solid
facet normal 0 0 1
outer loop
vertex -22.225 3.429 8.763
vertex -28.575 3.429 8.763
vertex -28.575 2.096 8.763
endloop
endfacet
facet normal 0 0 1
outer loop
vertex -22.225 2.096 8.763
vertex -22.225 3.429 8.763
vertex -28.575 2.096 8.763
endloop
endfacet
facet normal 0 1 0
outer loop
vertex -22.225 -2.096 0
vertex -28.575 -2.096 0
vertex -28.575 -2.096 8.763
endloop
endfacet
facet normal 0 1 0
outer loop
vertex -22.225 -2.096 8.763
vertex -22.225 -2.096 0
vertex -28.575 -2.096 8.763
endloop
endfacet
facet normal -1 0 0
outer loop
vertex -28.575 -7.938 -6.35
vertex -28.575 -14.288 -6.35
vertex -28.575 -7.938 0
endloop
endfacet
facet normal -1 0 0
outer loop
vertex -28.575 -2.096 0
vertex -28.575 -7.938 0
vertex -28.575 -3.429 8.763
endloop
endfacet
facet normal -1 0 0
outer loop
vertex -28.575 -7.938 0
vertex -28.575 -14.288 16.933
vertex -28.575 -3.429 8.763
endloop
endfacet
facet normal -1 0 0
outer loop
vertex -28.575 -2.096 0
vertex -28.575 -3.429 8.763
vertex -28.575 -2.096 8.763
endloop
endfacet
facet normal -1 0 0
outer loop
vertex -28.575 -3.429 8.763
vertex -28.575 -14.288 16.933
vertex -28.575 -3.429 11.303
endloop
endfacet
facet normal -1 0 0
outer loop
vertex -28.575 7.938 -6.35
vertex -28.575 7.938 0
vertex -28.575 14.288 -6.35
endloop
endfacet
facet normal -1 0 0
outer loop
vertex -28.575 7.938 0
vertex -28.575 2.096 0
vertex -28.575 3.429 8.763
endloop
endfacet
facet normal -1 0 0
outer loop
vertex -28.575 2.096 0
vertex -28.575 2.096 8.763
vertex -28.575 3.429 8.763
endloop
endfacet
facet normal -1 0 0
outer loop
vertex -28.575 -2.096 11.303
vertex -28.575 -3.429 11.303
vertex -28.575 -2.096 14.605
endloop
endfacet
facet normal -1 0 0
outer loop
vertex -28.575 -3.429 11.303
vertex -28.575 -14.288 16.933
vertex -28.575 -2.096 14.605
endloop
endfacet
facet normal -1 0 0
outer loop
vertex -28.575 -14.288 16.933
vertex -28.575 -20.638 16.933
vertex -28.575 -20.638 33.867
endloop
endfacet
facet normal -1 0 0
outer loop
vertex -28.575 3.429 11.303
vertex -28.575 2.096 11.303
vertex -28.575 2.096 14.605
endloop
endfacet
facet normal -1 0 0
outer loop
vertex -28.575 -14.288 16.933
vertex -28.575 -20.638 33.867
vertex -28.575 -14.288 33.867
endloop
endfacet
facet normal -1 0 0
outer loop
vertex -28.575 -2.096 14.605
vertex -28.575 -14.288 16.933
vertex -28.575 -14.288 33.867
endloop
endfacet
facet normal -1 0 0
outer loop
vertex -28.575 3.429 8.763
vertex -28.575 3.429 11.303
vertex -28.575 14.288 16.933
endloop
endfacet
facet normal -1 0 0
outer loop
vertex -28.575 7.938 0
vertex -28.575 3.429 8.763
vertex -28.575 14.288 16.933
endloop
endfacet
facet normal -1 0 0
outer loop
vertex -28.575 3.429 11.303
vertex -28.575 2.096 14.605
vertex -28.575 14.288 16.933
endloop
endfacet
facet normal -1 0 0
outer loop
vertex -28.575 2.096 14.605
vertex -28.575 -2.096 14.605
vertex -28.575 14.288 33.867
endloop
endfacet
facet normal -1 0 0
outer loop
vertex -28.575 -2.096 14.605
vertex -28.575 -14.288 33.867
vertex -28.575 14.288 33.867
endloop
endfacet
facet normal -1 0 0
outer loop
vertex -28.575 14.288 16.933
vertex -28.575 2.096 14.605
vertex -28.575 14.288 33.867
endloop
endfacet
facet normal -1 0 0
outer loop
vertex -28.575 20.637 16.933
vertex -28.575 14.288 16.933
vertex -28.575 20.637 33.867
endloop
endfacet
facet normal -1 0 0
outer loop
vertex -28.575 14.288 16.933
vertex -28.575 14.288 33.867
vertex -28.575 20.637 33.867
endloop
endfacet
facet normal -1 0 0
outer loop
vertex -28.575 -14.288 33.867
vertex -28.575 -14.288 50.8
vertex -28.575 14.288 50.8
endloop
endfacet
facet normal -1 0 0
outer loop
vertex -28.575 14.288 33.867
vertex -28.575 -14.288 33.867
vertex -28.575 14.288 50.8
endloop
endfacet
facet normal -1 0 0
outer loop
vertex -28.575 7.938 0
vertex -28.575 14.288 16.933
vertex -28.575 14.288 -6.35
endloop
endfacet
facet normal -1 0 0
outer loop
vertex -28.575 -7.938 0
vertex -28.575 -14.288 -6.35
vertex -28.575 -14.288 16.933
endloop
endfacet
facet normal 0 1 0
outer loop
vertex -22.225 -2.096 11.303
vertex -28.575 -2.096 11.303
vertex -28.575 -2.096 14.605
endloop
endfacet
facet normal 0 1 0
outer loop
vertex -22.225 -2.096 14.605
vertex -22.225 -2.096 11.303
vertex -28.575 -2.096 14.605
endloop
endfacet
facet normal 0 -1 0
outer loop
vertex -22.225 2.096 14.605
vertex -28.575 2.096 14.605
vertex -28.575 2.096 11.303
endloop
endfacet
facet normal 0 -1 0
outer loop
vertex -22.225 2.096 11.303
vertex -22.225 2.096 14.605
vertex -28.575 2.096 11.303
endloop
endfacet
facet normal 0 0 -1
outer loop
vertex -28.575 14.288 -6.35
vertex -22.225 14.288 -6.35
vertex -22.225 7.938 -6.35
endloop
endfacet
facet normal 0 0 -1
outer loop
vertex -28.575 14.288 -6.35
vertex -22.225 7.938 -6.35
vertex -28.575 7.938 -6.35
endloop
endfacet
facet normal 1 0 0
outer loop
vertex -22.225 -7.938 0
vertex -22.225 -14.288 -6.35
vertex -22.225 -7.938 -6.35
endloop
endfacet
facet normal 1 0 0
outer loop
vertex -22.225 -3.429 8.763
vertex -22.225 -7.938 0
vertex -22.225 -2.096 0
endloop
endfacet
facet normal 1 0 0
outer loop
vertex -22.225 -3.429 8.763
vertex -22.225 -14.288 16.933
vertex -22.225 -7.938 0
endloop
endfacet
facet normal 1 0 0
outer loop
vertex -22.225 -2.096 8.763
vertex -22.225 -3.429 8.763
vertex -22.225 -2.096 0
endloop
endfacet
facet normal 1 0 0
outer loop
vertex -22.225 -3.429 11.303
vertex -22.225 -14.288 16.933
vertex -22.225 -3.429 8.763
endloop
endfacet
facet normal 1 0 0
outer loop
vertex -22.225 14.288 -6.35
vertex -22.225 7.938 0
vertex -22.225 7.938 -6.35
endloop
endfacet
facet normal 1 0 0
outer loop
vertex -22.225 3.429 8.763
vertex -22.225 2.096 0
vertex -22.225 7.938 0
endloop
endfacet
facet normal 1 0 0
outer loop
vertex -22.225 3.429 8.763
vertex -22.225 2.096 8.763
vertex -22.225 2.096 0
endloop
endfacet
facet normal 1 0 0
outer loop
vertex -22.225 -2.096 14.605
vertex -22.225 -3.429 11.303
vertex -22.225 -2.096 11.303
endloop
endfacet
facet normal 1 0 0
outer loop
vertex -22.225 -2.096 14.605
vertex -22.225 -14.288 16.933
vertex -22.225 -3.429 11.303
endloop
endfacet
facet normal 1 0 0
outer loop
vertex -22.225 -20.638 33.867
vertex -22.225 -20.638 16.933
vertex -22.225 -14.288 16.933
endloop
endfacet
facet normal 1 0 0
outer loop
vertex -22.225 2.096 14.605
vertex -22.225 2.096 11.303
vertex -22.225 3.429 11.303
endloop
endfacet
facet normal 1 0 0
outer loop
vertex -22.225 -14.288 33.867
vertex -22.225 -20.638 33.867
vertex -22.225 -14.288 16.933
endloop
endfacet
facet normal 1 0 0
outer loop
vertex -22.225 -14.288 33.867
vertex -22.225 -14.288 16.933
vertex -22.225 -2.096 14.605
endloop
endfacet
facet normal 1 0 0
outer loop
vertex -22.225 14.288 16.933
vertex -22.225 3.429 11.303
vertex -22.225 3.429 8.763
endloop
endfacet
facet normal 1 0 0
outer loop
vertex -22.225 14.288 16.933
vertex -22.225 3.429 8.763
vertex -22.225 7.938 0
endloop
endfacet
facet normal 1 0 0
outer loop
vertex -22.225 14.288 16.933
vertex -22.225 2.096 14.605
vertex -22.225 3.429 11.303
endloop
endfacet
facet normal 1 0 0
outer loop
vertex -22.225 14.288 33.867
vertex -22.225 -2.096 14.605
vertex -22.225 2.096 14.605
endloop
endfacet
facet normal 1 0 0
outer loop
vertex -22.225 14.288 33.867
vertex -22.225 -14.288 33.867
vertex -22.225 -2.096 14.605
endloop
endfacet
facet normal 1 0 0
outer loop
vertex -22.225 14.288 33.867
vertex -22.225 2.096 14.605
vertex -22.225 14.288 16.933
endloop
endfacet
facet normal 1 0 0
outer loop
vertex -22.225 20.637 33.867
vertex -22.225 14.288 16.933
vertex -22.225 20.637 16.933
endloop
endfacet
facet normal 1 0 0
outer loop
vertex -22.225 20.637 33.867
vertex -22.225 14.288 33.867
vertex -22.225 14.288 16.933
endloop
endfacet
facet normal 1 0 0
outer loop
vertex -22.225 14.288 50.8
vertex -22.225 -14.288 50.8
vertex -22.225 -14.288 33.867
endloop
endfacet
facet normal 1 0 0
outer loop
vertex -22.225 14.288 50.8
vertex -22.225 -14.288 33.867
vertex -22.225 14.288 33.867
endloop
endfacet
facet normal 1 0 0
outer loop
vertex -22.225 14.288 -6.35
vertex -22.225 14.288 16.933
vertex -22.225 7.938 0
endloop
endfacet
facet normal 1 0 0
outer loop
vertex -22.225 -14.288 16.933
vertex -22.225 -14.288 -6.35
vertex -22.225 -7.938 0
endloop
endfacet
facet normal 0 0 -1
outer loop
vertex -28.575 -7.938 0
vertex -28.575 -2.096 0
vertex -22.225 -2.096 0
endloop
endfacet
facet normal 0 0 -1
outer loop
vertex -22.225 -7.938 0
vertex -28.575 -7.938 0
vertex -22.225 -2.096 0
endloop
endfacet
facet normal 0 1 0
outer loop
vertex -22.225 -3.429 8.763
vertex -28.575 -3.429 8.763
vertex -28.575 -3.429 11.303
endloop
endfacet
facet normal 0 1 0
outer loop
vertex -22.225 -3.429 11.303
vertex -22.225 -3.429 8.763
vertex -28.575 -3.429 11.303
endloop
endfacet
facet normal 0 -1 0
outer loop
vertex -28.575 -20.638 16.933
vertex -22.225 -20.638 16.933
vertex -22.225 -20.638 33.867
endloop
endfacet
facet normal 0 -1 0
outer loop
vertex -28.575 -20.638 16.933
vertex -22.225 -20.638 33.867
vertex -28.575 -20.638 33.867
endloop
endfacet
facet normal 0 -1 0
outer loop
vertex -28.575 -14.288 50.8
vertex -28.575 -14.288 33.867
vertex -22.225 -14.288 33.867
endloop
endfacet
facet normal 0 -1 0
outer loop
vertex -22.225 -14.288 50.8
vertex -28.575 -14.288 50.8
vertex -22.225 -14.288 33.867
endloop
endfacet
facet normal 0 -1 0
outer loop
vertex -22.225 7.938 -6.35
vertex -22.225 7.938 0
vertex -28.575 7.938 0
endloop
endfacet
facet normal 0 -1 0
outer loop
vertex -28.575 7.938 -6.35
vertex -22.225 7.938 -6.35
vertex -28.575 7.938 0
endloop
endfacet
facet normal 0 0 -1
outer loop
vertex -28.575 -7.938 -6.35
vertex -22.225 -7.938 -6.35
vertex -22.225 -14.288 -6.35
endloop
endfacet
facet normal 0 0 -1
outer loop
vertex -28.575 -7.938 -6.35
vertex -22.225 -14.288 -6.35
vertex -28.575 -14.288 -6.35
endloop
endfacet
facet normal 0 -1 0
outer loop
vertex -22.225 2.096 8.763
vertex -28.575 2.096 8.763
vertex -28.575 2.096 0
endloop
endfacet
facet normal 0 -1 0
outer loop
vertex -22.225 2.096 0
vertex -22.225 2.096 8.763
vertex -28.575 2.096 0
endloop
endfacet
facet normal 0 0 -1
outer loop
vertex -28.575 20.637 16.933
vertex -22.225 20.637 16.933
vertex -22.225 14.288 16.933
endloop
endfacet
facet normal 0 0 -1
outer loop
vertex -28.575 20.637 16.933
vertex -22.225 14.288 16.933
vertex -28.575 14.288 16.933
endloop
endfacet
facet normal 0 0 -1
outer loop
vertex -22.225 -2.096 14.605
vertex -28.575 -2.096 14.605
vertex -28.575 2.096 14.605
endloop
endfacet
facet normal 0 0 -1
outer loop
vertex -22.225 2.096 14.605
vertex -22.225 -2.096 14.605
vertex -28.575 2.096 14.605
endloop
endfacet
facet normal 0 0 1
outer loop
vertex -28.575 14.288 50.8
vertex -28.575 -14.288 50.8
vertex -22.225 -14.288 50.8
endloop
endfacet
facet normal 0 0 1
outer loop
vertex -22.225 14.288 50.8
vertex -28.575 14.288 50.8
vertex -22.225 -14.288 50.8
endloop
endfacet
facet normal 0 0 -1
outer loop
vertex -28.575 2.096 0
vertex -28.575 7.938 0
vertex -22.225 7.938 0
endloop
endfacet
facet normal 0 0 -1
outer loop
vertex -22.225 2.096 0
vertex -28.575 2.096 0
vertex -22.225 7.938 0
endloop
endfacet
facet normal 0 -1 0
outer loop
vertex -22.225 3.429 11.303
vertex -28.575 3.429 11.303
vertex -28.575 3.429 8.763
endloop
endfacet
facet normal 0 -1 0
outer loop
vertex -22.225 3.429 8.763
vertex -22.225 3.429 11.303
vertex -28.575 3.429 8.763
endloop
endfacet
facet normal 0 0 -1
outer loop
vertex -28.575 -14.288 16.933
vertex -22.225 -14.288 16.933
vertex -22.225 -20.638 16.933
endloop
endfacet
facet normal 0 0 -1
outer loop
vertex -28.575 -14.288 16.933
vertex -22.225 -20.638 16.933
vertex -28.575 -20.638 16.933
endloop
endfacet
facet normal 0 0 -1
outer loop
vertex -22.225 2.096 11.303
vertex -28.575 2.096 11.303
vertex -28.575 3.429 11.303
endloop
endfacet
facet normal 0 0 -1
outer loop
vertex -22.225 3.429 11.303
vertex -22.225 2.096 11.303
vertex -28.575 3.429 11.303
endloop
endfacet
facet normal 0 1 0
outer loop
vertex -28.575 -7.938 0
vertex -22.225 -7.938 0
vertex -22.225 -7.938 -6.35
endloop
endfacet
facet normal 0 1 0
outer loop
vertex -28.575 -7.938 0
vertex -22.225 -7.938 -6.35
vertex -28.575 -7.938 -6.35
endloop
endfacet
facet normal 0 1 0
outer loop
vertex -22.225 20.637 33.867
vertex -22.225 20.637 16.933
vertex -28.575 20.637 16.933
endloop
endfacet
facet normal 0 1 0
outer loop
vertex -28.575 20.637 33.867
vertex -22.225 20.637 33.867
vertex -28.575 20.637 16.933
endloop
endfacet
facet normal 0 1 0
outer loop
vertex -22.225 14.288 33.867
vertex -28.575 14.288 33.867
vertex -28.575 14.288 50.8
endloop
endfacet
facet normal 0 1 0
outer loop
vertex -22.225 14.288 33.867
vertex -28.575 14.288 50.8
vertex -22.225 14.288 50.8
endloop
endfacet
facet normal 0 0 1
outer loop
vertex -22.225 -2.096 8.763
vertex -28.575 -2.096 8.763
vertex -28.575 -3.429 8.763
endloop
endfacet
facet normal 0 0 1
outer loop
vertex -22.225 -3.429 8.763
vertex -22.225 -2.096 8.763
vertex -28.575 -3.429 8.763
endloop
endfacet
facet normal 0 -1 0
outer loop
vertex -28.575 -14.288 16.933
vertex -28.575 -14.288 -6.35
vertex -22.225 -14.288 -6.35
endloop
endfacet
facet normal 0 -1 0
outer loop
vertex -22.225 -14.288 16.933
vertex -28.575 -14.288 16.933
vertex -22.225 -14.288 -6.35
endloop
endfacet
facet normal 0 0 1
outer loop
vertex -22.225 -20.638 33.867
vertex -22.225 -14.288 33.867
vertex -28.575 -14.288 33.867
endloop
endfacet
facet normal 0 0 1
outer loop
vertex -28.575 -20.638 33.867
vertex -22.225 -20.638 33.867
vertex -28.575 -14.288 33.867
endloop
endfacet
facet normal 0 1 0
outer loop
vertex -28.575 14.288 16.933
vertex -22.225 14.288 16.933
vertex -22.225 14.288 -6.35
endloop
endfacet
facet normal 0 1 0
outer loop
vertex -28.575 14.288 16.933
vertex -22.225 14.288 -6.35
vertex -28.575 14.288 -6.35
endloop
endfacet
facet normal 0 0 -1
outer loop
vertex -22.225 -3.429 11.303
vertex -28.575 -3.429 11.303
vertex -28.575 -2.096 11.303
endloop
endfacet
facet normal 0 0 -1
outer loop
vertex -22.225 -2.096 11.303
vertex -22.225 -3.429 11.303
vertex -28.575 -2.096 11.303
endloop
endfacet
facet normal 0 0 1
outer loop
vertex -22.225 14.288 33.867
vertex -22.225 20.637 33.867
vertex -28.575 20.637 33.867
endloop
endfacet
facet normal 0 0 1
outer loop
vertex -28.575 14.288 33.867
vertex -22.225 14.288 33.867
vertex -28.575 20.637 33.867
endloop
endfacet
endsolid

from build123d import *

# Parameters (mm, degrees)
SKETCH1_W           = 6.35
SKETCH1_H           = 28.575
BOSS_EXTRUDE1_DEPTH = 50.8
BOSS_EXTRUDE2_START = -34.925
SKETCH2_W           = 6.35
SKETCH2_H           = 16.933333334
BOSS_EXTRUDE2_DEPTH = 41.275
SKETCH3_W           = 6.35
SKETCH3_H           = 6.35
BOSS_EXTRUDE3_DEPTH = 6.35
CUT_EXTRUDE1_DEPTH  = 56.198450216


with BuildPart() as part:
    # Sketch1 → Boss-Extrude1 (new body)
    with BuildSketch(Plane.XY):
        with Locations((-25.4, 0)):
            Rectangle(SKETCH1_W, SKETCH1_H)
    extrude(amount=BOSS_EXTRUDE1_DEPTH)

    # Sketch2 → Boss-Extrude2 (add)
    with BuildSketch(Plane(origin=(0, -14.2875, 0), x_dir=(-1, 0, 0), z_dir=(0, -1, 0)).offset(BOSS_EXTRUDE2_START)):
        with Locations((25.4, -25.4)):
            Rectangle(SKETCH2_W, SKETCH2_H)
    extrude(amount=BOSS_EXTRUDE2_DEPTH)

    # Sketch3 → Boss-Extrude3 (add)
    with BuildSketch(Plane(origin=(0, 0, 0), x_dir=(-1, 0, 0), z_dir=(0, 0, -1))):
        with Locations((25.4, 11.1125)):
            Rectangle(SKETCH3_W, SKETCH3_H)
        with Locations((25.4, -11.1125)):
            Rectangle(SKETCH3_W, SKETCH3_H)
    extrude(amount=BOSS_EXTRUDE3_DEPTH)

    # Sketch4 → Cut-Extrude1 (cut, through all)
    with BuildSketch(Plane.ZY.offset(28.575)):
        Polygon((0, 2.0955), (0, -2.0955), (8.763, -2.0955), (8.763, -3.429), (11.303, -3.429), (11.303, -2.0955), (14.605, -2.0955), (14.605, 2.0955), (11.303, 2.0955), (11.303, 3.429), (8.763, 3.429), (8.763, 2.0955), align=None)
    extrude(amount=-CUT_EXTRUDE1_DEPTH, mode=Mode.SUBTRACT)


solid = part.part
